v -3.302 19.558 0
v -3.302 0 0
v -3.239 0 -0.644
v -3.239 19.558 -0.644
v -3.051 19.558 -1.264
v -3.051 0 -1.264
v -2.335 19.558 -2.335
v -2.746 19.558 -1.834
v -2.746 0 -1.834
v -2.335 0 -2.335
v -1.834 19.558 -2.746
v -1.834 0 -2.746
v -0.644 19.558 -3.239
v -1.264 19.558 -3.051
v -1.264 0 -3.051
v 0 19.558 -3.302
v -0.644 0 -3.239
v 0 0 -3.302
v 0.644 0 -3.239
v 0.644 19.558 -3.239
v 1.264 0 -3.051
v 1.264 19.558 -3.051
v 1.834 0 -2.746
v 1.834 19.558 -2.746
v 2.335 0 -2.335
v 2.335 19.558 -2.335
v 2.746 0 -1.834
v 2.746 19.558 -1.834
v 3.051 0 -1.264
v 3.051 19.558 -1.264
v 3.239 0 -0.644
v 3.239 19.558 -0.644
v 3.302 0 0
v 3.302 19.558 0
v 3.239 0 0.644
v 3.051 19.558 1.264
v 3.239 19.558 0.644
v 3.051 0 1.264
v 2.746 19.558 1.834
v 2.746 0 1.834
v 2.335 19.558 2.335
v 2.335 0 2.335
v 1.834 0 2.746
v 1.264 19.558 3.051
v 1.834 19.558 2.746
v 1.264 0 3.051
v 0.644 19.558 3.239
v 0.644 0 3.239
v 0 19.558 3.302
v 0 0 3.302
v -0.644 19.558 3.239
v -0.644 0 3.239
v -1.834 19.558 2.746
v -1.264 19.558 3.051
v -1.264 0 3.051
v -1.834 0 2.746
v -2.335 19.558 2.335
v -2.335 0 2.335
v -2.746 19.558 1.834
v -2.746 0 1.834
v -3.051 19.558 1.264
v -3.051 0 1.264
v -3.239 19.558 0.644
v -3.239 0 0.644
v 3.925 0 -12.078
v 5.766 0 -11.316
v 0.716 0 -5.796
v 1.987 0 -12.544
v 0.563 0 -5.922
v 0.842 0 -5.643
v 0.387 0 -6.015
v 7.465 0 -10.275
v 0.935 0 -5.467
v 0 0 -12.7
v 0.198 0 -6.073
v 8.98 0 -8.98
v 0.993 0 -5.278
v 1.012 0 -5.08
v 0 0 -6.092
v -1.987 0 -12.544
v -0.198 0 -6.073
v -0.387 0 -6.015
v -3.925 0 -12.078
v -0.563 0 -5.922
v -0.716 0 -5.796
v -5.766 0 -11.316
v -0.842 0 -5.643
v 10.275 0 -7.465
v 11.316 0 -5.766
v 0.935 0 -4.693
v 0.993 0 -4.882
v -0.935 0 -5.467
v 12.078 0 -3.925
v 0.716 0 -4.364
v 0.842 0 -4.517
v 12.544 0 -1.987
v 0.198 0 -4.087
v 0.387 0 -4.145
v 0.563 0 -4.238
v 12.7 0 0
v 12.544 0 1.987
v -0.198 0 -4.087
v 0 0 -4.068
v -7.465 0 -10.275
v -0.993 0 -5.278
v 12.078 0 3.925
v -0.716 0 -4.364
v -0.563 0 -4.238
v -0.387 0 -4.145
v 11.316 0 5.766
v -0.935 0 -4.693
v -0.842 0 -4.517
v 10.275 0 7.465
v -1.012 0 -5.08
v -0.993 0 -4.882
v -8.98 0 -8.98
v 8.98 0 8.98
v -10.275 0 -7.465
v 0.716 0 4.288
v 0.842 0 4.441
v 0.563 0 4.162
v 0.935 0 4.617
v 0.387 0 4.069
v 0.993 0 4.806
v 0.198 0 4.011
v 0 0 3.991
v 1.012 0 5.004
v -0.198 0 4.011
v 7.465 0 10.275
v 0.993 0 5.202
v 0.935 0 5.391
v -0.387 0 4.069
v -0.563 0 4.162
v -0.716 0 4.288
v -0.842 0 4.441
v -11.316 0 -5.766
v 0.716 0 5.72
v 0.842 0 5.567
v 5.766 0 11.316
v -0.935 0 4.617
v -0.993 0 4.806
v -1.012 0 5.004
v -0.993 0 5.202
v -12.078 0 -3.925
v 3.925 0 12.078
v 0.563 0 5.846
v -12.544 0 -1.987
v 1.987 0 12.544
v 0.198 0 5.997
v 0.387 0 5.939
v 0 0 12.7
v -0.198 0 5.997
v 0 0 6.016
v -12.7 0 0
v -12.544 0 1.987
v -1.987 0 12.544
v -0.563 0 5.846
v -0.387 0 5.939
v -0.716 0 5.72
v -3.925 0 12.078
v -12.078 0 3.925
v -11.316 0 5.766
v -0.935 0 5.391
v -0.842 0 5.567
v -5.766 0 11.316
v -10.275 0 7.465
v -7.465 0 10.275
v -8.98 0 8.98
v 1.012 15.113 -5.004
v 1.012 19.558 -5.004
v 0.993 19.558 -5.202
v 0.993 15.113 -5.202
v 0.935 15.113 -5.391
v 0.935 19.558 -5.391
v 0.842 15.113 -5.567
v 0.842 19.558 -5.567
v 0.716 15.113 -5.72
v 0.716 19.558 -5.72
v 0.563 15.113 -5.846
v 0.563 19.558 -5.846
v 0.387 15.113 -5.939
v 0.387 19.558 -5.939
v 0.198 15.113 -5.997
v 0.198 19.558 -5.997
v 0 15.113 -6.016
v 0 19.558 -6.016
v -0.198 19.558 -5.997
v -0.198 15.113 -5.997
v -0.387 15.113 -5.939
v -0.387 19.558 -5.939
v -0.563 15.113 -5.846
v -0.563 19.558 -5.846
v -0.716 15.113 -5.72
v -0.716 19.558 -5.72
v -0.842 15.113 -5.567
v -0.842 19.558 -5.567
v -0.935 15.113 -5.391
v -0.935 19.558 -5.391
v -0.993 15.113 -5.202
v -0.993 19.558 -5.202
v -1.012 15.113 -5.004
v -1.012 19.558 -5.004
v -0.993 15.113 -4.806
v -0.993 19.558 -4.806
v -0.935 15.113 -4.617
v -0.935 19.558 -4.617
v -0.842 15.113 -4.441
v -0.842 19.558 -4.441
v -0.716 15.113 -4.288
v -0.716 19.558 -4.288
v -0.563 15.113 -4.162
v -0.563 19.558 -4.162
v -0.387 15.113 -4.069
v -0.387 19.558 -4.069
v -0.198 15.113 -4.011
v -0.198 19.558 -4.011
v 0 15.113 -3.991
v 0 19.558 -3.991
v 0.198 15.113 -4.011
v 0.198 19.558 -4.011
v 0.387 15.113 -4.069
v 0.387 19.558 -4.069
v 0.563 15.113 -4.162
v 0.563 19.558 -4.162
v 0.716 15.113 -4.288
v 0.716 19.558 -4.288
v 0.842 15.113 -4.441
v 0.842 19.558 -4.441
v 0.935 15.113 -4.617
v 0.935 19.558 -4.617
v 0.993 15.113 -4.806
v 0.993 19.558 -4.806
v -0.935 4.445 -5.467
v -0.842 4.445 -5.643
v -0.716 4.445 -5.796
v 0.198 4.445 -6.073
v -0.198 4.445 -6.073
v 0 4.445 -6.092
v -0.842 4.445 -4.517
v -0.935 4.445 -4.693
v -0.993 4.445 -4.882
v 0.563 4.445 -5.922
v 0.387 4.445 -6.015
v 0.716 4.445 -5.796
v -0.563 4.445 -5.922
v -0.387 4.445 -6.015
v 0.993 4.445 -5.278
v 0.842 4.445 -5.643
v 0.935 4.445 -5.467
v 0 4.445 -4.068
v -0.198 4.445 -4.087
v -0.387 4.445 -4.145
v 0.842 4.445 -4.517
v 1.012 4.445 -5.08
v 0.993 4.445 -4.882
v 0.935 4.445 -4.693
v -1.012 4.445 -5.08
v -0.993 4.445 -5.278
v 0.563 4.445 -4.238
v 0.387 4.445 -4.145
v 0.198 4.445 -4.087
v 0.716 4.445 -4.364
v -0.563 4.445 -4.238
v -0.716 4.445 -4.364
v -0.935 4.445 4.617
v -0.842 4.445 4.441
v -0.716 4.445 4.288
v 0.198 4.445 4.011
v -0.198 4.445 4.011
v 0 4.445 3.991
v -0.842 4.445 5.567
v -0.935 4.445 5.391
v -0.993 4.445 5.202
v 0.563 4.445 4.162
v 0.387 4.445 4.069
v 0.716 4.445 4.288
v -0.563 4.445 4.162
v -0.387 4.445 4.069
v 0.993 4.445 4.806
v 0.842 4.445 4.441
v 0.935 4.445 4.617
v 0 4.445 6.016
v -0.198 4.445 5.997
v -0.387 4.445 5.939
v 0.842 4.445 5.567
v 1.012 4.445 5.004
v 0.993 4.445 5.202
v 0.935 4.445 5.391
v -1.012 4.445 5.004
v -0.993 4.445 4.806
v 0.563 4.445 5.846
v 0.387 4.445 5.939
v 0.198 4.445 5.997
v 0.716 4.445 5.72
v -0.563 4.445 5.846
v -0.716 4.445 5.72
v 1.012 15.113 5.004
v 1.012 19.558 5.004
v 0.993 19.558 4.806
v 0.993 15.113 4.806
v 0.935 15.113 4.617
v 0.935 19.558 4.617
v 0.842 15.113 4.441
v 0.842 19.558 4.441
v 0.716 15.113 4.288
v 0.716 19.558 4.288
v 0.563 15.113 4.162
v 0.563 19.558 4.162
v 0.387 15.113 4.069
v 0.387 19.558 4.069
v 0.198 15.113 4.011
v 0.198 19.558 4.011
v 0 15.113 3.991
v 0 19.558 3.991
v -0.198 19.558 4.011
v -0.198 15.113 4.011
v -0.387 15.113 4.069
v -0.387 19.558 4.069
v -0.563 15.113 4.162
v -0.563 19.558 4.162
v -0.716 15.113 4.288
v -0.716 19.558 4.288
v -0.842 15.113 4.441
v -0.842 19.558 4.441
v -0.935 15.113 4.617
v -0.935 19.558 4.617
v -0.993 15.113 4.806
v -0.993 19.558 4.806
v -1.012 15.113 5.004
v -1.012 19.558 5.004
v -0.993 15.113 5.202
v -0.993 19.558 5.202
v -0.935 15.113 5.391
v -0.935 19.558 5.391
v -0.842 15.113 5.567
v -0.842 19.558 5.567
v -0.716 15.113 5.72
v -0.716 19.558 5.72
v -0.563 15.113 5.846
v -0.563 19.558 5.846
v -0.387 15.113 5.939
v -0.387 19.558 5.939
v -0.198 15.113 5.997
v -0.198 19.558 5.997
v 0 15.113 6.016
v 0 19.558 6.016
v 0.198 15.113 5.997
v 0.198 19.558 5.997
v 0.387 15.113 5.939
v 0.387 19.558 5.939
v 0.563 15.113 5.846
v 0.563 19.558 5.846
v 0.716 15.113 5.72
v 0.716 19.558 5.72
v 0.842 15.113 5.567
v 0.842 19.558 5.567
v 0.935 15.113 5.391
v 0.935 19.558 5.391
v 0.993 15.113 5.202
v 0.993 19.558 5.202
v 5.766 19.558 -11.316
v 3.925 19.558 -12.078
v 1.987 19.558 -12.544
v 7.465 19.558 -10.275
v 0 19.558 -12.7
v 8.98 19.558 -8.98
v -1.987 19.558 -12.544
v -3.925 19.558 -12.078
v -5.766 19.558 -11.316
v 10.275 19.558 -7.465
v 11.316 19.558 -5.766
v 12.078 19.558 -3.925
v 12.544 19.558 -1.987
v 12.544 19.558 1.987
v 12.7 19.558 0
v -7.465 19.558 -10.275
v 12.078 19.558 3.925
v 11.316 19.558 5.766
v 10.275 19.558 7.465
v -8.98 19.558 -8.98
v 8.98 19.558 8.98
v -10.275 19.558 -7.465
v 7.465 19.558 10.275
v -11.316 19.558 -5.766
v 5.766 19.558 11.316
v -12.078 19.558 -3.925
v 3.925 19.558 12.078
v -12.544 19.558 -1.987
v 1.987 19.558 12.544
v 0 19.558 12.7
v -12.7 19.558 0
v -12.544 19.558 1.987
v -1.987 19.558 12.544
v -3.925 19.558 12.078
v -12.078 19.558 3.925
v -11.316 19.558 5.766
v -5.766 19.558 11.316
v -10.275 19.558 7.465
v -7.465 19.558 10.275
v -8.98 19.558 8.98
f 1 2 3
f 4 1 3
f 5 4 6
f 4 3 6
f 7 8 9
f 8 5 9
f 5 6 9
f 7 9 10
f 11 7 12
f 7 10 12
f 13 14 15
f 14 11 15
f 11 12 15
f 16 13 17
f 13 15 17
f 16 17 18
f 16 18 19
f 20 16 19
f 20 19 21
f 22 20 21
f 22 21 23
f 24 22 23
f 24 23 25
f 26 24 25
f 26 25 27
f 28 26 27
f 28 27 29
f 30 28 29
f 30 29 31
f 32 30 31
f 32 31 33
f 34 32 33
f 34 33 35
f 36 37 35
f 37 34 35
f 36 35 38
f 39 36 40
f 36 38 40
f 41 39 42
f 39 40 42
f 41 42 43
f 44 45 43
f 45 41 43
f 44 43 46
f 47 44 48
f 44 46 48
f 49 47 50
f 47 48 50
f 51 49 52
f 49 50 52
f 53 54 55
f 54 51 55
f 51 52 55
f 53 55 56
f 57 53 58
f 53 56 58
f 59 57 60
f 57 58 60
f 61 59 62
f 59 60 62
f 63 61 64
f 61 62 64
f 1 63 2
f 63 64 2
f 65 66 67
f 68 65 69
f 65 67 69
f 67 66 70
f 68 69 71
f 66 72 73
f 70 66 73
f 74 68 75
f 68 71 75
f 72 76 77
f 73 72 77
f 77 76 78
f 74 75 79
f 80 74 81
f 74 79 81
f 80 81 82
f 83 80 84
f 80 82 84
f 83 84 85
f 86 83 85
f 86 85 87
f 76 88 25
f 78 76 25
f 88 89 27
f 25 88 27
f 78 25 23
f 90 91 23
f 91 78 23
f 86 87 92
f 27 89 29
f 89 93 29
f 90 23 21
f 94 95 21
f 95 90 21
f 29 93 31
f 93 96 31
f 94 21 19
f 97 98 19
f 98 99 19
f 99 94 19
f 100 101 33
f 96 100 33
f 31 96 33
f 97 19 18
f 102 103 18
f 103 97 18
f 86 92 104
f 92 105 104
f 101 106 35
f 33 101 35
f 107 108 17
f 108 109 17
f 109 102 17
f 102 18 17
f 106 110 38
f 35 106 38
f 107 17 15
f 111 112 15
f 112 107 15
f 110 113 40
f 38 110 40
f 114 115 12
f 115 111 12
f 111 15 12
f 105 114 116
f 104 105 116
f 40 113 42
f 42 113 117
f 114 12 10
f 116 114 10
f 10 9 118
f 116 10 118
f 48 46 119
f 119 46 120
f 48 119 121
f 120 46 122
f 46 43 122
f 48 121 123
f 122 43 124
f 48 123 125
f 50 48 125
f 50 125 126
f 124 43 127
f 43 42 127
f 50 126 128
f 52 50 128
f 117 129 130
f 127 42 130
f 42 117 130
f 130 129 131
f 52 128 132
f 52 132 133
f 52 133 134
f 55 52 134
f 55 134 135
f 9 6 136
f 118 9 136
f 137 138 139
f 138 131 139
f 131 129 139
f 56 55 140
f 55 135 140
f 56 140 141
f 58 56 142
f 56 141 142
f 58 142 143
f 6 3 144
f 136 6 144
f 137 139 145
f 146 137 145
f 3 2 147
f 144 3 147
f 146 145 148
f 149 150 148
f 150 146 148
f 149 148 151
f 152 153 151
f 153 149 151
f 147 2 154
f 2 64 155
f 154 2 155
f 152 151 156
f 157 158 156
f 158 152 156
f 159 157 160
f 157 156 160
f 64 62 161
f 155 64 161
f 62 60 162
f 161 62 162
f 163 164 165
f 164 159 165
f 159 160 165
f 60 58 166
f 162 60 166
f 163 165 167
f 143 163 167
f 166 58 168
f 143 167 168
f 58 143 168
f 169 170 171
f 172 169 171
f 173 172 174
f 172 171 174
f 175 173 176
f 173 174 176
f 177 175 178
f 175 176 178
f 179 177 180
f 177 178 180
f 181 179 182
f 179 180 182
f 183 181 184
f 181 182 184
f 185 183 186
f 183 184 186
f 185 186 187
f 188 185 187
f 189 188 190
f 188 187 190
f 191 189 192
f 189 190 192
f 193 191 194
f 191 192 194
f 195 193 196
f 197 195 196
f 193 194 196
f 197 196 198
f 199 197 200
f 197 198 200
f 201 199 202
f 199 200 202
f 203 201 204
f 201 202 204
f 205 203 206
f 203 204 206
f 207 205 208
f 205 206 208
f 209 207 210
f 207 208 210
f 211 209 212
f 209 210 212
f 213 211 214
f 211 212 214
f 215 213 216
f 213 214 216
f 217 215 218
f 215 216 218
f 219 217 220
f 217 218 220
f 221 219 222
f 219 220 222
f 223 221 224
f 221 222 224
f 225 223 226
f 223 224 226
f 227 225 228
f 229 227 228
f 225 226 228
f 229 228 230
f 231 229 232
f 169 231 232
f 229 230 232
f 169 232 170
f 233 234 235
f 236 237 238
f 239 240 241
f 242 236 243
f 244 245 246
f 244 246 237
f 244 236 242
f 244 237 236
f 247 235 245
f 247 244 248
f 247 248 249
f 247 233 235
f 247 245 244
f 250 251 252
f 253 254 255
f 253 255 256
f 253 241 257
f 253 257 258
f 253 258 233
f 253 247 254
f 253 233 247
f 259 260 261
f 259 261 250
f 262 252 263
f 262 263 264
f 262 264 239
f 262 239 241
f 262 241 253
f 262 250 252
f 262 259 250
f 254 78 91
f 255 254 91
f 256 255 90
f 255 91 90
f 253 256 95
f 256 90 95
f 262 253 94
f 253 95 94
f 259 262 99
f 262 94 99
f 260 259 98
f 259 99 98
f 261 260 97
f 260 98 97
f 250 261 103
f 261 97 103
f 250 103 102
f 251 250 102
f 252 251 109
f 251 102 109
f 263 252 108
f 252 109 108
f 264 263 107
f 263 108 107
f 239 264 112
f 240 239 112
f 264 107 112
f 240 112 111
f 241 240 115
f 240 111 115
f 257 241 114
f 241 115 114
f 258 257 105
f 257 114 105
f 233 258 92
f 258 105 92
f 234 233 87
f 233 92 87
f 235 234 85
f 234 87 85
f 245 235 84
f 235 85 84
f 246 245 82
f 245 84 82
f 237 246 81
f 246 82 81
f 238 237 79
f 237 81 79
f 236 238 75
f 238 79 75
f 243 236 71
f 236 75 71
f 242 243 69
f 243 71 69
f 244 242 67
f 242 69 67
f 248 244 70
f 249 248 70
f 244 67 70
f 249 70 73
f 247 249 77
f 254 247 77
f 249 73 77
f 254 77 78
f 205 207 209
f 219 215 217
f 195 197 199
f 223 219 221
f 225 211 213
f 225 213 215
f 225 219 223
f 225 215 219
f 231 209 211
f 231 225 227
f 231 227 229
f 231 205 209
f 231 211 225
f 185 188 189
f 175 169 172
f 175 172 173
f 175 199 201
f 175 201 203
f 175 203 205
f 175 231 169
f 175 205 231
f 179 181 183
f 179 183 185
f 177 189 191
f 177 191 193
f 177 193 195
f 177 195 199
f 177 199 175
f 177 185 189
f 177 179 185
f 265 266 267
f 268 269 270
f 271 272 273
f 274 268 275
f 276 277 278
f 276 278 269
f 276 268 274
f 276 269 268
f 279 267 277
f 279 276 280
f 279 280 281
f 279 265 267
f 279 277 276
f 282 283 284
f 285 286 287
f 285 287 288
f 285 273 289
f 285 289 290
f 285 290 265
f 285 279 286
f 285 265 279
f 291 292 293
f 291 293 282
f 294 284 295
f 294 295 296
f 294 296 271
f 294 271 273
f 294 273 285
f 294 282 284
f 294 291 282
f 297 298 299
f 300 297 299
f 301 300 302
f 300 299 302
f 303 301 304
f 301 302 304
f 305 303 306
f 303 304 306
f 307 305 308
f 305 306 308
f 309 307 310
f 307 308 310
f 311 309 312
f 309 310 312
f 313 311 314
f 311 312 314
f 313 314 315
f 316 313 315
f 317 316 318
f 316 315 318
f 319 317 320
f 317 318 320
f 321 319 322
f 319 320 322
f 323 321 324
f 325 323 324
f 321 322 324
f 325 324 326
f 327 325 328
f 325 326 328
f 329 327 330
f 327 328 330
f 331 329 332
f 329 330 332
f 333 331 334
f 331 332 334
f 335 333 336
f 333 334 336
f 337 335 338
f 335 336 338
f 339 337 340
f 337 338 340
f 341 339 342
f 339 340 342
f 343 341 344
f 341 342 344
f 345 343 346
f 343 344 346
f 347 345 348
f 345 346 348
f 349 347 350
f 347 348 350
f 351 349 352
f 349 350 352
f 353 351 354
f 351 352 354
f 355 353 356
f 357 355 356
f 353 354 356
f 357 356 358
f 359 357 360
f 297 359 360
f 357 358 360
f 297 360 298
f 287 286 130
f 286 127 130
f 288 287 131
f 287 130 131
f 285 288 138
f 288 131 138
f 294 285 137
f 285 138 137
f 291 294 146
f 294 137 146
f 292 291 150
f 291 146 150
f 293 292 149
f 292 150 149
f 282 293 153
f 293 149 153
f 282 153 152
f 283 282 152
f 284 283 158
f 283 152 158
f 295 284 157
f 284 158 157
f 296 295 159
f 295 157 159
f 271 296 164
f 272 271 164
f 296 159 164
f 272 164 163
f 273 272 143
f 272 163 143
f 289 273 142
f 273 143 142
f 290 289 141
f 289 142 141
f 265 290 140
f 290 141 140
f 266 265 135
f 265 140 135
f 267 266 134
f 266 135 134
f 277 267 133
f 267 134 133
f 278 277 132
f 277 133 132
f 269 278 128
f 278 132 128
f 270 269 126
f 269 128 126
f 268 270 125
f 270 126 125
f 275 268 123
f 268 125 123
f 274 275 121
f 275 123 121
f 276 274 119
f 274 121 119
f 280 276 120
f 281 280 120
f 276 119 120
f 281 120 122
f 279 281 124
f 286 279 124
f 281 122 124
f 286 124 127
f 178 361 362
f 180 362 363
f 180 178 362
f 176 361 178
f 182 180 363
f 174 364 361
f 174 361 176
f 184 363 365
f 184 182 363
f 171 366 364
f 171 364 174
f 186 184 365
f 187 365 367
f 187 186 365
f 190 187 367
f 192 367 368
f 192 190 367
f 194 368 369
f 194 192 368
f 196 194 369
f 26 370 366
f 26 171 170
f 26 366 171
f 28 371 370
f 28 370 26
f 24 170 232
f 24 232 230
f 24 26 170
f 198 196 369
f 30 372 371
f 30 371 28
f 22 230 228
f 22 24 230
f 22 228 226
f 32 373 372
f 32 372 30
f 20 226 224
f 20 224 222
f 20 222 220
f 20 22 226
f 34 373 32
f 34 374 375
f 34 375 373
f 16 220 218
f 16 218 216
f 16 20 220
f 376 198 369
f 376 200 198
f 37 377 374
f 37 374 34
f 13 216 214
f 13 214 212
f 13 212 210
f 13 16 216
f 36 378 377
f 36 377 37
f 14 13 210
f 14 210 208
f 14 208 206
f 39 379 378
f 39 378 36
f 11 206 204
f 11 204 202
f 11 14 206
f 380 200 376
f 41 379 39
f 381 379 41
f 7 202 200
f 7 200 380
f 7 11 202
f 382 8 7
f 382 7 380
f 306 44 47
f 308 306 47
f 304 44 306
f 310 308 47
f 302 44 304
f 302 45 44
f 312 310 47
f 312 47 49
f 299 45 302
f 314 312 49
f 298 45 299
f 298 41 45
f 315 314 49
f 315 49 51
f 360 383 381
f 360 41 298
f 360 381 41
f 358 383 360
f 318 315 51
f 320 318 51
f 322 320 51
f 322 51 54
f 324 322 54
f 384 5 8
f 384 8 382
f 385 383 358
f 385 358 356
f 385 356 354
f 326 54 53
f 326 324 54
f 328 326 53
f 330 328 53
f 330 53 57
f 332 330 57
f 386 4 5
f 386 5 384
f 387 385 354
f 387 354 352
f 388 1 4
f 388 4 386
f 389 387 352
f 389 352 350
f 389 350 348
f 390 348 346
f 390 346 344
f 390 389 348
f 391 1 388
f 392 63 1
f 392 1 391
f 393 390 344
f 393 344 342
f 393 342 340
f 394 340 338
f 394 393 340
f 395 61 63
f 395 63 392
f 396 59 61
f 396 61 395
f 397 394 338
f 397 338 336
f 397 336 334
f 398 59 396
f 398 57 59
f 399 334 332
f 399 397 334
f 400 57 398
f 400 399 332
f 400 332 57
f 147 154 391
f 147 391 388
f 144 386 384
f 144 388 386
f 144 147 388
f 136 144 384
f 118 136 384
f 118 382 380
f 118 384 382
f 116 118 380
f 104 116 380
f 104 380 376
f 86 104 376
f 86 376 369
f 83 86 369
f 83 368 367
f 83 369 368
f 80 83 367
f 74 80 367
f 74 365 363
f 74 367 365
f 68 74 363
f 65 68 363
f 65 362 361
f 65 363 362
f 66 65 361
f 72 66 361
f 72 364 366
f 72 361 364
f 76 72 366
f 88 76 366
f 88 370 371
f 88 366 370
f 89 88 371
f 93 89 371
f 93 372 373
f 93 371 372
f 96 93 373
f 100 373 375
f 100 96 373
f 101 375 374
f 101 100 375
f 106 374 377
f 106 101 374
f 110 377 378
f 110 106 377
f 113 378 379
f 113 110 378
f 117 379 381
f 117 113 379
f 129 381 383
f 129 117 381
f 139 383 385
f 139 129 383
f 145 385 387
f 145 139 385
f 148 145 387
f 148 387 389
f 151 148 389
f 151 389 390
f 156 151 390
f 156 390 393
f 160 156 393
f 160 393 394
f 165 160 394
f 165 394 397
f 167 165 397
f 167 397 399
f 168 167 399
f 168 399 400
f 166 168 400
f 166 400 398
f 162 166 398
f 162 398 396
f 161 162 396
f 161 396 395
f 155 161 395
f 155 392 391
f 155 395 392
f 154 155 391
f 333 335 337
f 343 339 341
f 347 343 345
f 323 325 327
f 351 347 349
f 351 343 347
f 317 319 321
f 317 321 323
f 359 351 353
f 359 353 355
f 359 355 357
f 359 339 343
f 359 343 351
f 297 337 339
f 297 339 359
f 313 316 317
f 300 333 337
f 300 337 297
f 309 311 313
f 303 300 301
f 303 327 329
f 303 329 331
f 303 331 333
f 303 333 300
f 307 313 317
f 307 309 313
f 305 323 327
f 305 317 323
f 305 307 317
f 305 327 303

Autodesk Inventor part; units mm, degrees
ref_plane "YZ Plane" through (0, 0, 0) normal (1, 0, 0) x (0, 1, 0)
ref_plane "XZ Plane" through (0, 0, 0) normal (0, 1, 0) x (-1, 0, 0)
ref_plane "XY Plane" through (0, 0, 0) normal (0, 0, 1) x (1, 0, 0)
sketch "Sketch1" plane through (0, 0, 0) normal (0, 1, 0) x (-1, 0, 0)
  circle A0 centre (0, 0) radius 12.7
  circle A1 centre (0, 0) radius 3.302
  dimension "d0" = 25.4
  dimension "d1" = 6.604
extrude "Extrusion1" add sketch "Sketch1" along normal blind 19.558
sketch "Sketch2" plane through (0, 19.558, 0) normal (0, 1, 0) x (1, 0, 0)
  line L0 (0, 0) -> (0, -5.004)
  line L1 (0, -5.004) -> (0, 0)
  line L2 (0, 0) -> (0, 5.004)
  circle A0 centre (0, -5.004) radius 1.0125
  circle A1 centre (0, 5.004) radius 1.0125
  dimension "d4" = 5.004
  dimension "d5" = 5.004
  dimension "d6" = 2.025
  dimension "d7" = 2.025
extrude "Extrusion2" cut sketch "Sketch2" against normal blind 4.445
sketch "Sketch3" plane through (0, 0, 0) normal (0, -1, 0) x (1, 0, 0)
  line L0 (0, 0) -> (0, 5.004)
  line L1 (0, 5.004) -> (0, -5.08)
  circle A0 centre (0, 5.004) radius 1.0125
  line L2 (0, 0) -> (0, -5.004)
  circle A1 centre (0, -5.08) radius 1.0125
  dimension "d10" = 5.004
  dimension "d15" = 2.025
  dimension "d16" = 5.004
  dimension "d17" = 2.025
extrude "Extrusion3" cut sketch "Sketch3" against normal blind 4.445
properties part number "PolarisPost_HeightAdjustment_0p5in_Machined"
